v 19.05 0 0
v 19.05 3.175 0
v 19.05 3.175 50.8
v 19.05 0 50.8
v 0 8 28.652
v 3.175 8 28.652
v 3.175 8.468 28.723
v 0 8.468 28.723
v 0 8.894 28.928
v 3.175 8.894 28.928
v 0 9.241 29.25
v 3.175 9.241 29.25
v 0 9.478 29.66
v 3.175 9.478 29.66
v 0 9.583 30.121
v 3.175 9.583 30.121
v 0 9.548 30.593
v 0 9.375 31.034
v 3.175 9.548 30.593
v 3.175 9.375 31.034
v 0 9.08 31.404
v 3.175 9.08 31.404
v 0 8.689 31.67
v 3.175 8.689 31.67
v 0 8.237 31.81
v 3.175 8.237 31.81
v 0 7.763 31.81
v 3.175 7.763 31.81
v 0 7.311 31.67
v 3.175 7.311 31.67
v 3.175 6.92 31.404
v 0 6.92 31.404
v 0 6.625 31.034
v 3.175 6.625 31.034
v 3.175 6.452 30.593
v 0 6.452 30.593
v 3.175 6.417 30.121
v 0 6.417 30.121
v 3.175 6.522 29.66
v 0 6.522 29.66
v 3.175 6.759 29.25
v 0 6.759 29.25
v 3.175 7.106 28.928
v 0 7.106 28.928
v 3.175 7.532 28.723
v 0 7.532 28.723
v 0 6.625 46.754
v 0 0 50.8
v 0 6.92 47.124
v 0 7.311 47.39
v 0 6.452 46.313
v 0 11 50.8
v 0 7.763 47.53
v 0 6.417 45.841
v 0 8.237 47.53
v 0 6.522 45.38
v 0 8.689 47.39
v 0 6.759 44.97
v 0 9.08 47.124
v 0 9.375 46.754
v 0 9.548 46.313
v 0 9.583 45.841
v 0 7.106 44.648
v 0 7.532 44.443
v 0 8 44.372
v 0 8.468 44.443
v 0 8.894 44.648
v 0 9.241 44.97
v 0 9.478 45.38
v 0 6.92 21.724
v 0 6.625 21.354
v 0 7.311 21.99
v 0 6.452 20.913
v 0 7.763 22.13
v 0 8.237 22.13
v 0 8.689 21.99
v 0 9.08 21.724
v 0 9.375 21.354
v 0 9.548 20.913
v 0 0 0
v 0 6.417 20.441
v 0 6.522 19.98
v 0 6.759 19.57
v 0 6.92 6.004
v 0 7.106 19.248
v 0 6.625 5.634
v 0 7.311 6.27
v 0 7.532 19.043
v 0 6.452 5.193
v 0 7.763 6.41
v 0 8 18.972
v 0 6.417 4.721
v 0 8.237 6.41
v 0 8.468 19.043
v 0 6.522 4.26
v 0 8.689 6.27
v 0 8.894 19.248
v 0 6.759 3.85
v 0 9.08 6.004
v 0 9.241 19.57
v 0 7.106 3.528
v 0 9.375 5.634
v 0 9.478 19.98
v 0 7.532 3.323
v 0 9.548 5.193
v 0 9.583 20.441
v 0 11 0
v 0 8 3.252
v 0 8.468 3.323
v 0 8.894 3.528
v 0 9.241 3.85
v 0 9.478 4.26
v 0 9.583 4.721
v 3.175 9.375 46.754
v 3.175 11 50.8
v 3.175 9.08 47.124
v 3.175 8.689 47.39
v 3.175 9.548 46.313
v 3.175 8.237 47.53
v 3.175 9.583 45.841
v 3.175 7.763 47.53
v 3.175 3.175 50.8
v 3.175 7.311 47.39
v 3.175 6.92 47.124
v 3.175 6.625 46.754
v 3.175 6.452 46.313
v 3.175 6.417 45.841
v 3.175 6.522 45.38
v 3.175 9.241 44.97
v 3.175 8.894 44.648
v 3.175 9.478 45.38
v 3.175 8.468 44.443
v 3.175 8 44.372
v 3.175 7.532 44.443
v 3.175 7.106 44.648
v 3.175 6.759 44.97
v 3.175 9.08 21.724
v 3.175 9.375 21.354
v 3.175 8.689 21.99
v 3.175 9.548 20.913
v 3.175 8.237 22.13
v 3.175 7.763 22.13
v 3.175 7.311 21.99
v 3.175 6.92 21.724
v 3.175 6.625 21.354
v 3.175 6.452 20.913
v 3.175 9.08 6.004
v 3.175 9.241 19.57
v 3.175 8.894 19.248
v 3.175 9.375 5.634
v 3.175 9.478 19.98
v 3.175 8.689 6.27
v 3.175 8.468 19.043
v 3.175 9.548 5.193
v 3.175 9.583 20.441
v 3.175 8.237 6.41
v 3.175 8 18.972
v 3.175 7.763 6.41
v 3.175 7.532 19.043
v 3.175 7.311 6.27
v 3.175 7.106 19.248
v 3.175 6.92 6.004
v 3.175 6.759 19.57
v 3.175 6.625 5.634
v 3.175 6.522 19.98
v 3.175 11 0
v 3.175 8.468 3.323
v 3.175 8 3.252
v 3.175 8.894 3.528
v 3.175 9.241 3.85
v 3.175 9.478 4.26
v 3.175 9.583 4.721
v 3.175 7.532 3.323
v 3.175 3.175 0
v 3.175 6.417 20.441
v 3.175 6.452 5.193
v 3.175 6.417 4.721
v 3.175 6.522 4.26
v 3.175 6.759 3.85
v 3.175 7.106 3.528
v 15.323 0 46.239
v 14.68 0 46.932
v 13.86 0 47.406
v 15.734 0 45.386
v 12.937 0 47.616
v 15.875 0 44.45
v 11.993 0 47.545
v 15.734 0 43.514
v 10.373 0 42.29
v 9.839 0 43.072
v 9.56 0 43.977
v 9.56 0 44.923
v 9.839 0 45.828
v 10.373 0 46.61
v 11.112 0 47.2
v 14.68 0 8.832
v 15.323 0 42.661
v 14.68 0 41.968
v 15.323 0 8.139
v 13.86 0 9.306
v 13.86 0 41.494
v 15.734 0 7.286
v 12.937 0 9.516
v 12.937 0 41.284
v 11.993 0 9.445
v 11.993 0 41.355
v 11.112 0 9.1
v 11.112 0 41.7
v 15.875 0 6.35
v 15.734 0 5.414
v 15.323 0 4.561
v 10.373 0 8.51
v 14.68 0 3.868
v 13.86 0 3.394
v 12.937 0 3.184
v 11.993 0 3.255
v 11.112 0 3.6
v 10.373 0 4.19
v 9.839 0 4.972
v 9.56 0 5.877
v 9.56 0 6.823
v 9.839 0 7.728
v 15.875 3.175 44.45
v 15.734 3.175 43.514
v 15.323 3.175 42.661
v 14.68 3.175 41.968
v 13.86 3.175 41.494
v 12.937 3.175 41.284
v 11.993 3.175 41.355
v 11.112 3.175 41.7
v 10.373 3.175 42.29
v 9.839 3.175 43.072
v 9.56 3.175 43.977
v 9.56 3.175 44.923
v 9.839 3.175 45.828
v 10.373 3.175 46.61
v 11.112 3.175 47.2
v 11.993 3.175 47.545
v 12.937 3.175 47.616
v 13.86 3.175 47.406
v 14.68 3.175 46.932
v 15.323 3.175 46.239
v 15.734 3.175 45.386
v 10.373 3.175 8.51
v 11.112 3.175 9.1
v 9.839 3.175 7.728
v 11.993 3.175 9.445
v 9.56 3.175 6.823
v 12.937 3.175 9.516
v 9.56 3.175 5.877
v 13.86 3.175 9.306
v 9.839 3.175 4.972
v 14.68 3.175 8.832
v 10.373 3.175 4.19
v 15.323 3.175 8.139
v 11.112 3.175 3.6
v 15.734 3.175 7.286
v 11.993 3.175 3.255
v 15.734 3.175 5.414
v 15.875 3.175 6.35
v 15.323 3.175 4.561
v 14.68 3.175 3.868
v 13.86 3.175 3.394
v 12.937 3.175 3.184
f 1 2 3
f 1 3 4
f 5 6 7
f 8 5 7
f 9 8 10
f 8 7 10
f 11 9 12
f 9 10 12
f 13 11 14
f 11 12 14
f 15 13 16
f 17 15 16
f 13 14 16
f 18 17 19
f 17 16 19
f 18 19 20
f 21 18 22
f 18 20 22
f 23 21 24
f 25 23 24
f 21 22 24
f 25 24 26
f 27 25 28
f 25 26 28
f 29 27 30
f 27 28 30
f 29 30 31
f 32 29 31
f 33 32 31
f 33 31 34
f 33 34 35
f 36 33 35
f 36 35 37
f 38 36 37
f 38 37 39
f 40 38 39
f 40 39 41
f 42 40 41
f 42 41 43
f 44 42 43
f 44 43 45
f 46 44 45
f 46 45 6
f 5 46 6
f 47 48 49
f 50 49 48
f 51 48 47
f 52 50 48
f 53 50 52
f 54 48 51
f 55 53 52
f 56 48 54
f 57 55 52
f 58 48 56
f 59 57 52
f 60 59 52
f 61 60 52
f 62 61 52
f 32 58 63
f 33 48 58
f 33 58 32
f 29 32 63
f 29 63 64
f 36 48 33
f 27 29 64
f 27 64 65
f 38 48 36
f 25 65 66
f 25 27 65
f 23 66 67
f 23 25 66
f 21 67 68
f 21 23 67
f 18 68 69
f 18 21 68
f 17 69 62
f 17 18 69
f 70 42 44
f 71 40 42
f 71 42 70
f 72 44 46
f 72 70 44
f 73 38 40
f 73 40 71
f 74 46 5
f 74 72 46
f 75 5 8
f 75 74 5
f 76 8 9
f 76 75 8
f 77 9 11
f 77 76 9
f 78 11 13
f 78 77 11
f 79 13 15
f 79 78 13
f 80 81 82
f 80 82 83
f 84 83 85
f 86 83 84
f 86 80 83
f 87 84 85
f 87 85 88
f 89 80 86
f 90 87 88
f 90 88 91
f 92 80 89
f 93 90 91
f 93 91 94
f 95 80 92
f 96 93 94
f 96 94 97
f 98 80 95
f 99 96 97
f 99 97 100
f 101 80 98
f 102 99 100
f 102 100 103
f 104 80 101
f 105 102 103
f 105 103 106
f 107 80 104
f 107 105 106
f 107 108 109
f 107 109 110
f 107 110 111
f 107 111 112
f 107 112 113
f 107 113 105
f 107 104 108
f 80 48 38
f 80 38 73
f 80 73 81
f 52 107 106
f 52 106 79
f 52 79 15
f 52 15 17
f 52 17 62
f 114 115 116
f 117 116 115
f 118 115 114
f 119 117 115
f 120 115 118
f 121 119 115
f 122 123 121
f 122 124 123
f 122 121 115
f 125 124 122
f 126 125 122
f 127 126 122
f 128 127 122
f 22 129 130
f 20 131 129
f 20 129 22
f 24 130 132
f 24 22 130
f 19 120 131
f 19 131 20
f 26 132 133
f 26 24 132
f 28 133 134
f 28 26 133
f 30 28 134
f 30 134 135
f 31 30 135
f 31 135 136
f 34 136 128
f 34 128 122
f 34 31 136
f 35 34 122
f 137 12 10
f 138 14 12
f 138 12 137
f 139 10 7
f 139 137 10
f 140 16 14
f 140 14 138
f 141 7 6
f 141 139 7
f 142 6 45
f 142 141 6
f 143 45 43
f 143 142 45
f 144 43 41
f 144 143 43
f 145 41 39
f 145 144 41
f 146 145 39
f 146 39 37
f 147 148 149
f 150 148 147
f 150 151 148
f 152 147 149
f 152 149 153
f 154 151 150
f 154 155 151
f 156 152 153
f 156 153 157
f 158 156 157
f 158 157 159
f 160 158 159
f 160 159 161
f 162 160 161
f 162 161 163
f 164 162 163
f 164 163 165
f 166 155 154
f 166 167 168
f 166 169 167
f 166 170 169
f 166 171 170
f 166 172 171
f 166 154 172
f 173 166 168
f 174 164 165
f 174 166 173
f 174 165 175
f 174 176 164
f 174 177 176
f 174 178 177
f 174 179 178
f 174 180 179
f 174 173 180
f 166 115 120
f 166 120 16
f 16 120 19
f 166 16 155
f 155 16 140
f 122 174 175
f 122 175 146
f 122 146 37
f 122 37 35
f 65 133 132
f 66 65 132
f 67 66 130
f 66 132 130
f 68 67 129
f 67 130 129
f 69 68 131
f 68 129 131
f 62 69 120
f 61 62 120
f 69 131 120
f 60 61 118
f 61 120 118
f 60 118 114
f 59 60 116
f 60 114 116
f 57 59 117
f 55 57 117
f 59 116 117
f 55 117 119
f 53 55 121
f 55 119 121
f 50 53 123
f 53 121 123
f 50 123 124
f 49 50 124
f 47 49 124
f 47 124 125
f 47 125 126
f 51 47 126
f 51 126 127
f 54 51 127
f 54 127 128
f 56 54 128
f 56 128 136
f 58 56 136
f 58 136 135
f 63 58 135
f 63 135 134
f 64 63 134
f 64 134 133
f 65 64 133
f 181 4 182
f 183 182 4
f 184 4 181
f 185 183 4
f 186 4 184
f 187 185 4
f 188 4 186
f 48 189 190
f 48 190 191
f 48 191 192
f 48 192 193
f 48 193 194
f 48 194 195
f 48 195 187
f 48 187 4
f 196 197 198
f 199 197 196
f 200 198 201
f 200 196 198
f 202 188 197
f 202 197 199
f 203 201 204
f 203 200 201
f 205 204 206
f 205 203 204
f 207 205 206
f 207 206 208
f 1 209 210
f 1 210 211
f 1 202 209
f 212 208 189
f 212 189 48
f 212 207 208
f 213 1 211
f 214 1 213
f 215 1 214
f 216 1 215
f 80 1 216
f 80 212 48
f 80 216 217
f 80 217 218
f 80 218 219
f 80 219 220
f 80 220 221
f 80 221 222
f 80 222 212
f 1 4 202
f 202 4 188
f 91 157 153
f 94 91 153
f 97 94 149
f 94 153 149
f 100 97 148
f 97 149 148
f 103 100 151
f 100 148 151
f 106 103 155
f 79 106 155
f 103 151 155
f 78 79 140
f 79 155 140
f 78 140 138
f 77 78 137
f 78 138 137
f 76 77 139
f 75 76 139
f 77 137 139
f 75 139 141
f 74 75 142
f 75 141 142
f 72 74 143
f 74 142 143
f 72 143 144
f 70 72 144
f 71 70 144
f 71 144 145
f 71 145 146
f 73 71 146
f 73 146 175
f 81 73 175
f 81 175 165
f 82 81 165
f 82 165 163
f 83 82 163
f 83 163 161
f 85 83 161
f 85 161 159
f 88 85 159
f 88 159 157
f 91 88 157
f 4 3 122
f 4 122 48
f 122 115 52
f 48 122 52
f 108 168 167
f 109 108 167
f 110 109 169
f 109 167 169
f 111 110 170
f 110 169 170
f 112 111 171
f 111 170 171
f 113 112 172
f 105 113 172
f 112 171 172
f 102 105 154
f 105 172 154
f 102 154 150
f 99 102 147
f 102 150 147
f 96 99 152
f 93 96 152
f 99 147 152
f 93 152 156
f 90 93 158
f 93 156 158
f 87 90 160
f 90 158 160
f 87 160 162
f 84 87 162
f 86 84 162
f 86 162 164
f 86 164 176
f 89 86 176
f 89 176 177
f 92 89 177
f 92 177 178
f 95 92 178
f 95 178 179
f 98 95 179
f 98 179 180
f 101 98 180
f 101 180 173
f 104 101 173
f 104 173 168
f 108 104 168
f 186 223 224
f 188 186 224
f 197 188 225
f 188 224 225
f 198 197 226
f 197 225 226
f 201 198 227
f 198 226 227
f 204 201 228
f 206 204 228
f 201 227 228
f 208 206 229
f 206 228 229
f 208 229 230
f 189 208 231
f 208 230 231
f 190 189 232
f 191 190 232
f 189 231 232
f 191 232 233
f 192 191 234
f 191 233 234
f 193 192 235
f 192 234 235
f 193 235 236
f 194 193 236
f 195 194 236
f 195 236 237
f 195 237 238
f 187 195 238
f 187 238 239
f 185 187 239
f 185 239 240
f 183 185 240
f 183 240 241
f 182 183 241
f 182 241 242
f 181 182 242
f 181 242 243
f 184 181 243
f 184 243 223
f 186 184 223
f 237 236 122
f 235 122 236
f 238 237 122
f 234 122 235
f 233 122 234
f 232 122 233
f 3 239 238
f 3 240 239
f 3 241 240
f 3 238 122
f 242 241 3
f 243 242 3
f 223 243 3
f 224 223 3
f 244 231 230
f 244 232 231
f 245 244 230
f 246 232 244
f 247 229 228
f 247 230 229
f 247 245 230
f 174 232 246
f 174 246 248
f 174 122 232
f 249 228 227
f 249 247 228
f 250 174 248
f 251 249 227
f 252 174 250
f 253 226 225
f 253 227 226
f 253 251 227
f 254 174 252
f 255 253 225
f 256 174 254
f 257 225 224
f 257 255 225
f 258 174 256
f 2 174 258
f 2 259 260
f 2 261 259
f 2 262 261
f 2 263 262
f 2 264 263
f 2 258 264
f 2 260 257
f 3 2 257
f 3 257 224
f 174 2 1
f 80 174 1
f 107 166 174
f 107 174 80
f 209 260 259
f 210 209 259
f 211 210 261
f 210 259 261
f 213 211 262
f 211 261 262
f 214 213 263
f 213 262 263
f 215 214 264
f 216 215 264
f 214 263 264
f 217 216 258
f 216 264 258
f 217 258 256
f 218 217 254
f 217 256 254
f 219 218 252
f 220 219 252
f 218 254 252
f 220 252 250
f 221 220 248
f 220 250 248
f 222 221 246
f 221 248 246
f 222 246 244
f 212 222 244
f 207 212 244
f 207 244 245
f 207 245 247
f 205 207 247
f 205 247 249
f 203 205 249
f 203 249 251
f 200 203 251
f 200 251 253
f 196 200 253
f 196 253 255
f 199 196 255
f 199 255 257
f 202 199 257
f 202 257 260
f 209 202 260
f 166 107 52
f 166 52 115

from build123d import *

# Parameters (mm, degrees)
BOSS_EXTRUDE1_DEPTH = 50.8
SKETCH2_R           = 1.5875
CUT_EXTRUDE1_DEPTH  = 10
SKETCH5_R           = 3.175
CUT_EXTRUDE2_DEPTH  = 6.35


with BuildPart() as part:
    # Sketch1 → Boss-Extrude1 (new body)
    with BuildSketch(Plane.XY):
        Polygon((0, 0), (0, 11), (3.175, 11), (3.175, 3.175), (19.05, 3.175), (19.05, 0), align=None)
    extrude(amount=BOSS_EXTRUDE1_DEPTH)

    # Sketch2 → Cut-Extrude1 (cut)
    with BuildSketch(Plane(origin=(3.175, 0, 0), x_dir=(0, 0, -1), z_dir=(1, 0, 0))):
        with Locations((-45.96, 8)):
            Circle(SKETCH2_R)
        with Locations((-30.24, 8)):
            Circle(SKETCH2_R)
        with Locations((-20.56, 8)):
            Circle(SKETCH2_R)
        with Locations((-4.84, 8)):
            Circle(SKETCH2_R)
    extrude(amount=-CUT_EXTRUDE1_DEPTH, mode=Mode.SUBTRACT)

    # Sketch5 → Cut-Extrude2 (cut)
    with BuildSketch(Plane(origin=(0, 3.175, 0), x_dir=(1, 0, 0), z_dir=(0, 1, 0))):
        with Locations((12.7, -6.35)):
            Circle(SKETCH5_R)
        with Locations((12.7, -44.45)):
            Circle(SKETCH5_R)
    extrude(amount=-CUT_EXTRUDE2_DEPTH, mode=Mode.SUBTRACT)


solid = part.part
